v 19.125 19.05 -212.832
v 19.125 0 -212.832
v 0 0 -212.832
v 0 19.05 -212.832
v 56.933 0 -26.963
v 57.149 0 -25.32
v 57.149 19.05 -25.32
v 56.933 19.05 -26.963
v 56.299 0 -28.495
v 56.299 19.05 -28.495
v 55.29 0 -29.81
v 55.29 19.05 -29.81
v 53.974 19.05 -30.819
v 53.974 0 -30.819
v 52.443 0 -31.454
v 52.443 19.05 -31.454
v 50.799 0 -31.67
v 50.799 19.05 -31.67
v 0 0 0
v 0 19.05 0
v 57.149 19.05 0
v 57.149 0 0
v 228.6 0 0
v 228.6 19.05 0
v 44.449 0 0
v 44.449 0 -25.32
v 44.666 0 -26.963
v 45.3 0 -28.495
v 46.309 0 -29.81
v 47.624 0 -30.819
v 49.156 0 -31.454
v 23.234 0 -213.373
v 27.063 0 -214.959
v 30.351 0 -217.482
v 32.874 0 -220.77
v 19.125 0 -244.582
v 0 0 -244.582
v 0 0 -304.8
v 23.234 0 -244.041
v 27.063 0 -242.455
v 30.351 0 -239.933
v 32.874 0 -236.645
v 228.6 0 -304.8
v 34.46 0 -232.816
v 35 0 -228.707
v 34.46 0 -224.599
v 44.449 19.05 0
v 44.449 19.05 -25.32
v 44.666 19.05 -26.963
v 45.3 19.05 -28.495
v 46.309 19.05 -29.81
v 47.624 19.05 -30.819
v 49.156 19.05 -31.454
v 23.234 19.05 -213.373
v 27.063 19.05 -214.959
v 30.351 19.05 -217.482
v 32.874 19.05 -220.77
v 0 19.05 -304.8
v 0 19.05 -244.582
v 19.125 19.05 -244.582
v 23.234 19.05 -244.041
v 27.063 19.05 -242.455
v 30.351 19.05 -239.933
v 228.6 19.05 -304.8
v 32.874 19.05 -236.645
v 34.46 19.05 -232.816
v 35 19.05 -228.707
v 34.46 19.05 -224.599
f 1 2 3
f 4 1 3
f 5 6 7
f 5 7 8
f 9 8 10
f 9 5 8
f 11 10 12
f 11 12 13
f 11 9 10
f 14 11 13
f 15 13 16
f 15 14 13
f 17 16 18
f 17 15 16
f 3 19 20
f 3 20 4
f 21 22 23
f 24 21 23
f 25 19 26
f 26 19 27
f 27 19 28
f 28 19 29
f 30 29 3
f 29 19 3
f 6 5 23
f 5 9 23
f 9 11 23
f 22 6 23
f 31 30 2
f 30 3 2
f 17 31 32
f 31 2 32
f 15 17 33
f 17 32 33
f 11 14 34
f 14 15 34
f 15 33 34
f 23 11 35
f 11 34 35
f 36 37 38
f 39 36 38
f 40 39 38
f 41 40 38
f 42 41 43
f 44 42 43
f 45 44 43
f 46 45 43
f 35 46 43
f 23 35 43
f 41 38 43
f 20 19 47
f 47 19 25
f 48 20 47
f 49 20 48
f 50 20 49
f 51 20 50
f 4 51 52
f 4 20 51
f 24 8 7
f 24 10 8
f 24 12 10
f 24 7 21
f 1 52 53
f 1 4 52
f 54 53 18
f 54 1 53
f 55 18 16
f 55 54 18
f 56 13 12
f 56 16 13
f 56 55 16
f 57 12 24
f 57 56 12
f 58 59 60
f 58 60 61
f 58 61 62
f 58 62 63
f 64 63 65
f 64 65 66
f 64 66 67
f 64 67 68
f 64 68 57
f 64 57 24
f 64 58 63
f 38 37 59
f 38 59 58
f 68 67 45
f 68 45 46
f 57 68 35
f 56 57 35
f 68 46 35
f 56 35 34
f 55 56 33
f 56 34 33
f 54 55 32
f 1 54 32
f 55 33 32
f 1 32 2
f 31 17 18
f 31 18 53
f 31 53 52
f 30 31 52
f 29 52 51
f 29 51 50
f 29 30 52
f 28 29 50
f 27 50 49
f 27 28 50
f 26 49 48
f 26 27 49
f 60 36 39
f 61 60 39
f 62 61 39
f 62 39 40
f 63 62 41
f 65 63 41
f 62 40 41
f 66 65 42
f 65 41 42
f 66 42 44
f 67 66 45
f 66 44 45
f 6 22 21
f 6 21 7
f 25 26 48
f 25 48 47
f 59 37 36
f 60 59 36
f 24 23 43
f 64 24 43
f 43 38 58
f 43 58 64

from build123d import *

# Parameters (mm, degrees)
SKETCH1_W           = 228.6
SKETCH1_H           = 304.8
BOSS_EXTRUDE2_DEPTH = 19.05
CUT_EXTRUDE1_DEPTH  = 19.05


with BuildPart() as part:
    # Sketch1 → Boss-Extrude2 (new body)
    with BuildSketch(Plane(origin=(0, 0, 0), x_dir=(1, 0, 0), z_dir=(0, 1, 0))):
        with Locations((114.3, 152.4)):
            Rectangle(SKETCH1_W, SKETCH1_H)
    extrude(amount=BOSS_EXTRUDE2_DEPTH)

    # Sketch3 → Cut-Extrude1 (cut)
    with BuildSketch(Plane.XZ):
        with BuildLine():
            Line((19.125478143, -212.832325894), (0, -212.832325894))
            Line((0, -212.832325894), (0, -244.582325894))
            Line((0, -244.582325894), (19.125478143, -244.582325894))
            ThreePointArc((19.125478143, -244.582325894), (30.350798294, -239.932646046), (35.000478143, -228.707325894))
            ThreePointArc((35.000478143, -228.707325894), (30.350798294, -217.482005743), (19.125478143, -212.832325894))
        make_face()
        with BuildLine():
            Line((44.449497967, -25.319930082), (44.449497967, 0))
            Line((44.449497967, 0), (57.149497967, 0))
            Line((57.149497967, 0), (57.149497967, -25.319930082))
            ThreePointArc((57.149497967, -25.319930082), (55.289626028, -29.810058143), (50.799497967, -31.669930082))
            ThreePointArc((50.799497967, -31.669930082), (46.309369907, -29.810058143), (44.449497967, -25.319930082))
        make_face()
    extrude(amount=-CUT_EXTRUDE1_DEPTH, mode=Mode.SUBTRACT)


solid = part.part
